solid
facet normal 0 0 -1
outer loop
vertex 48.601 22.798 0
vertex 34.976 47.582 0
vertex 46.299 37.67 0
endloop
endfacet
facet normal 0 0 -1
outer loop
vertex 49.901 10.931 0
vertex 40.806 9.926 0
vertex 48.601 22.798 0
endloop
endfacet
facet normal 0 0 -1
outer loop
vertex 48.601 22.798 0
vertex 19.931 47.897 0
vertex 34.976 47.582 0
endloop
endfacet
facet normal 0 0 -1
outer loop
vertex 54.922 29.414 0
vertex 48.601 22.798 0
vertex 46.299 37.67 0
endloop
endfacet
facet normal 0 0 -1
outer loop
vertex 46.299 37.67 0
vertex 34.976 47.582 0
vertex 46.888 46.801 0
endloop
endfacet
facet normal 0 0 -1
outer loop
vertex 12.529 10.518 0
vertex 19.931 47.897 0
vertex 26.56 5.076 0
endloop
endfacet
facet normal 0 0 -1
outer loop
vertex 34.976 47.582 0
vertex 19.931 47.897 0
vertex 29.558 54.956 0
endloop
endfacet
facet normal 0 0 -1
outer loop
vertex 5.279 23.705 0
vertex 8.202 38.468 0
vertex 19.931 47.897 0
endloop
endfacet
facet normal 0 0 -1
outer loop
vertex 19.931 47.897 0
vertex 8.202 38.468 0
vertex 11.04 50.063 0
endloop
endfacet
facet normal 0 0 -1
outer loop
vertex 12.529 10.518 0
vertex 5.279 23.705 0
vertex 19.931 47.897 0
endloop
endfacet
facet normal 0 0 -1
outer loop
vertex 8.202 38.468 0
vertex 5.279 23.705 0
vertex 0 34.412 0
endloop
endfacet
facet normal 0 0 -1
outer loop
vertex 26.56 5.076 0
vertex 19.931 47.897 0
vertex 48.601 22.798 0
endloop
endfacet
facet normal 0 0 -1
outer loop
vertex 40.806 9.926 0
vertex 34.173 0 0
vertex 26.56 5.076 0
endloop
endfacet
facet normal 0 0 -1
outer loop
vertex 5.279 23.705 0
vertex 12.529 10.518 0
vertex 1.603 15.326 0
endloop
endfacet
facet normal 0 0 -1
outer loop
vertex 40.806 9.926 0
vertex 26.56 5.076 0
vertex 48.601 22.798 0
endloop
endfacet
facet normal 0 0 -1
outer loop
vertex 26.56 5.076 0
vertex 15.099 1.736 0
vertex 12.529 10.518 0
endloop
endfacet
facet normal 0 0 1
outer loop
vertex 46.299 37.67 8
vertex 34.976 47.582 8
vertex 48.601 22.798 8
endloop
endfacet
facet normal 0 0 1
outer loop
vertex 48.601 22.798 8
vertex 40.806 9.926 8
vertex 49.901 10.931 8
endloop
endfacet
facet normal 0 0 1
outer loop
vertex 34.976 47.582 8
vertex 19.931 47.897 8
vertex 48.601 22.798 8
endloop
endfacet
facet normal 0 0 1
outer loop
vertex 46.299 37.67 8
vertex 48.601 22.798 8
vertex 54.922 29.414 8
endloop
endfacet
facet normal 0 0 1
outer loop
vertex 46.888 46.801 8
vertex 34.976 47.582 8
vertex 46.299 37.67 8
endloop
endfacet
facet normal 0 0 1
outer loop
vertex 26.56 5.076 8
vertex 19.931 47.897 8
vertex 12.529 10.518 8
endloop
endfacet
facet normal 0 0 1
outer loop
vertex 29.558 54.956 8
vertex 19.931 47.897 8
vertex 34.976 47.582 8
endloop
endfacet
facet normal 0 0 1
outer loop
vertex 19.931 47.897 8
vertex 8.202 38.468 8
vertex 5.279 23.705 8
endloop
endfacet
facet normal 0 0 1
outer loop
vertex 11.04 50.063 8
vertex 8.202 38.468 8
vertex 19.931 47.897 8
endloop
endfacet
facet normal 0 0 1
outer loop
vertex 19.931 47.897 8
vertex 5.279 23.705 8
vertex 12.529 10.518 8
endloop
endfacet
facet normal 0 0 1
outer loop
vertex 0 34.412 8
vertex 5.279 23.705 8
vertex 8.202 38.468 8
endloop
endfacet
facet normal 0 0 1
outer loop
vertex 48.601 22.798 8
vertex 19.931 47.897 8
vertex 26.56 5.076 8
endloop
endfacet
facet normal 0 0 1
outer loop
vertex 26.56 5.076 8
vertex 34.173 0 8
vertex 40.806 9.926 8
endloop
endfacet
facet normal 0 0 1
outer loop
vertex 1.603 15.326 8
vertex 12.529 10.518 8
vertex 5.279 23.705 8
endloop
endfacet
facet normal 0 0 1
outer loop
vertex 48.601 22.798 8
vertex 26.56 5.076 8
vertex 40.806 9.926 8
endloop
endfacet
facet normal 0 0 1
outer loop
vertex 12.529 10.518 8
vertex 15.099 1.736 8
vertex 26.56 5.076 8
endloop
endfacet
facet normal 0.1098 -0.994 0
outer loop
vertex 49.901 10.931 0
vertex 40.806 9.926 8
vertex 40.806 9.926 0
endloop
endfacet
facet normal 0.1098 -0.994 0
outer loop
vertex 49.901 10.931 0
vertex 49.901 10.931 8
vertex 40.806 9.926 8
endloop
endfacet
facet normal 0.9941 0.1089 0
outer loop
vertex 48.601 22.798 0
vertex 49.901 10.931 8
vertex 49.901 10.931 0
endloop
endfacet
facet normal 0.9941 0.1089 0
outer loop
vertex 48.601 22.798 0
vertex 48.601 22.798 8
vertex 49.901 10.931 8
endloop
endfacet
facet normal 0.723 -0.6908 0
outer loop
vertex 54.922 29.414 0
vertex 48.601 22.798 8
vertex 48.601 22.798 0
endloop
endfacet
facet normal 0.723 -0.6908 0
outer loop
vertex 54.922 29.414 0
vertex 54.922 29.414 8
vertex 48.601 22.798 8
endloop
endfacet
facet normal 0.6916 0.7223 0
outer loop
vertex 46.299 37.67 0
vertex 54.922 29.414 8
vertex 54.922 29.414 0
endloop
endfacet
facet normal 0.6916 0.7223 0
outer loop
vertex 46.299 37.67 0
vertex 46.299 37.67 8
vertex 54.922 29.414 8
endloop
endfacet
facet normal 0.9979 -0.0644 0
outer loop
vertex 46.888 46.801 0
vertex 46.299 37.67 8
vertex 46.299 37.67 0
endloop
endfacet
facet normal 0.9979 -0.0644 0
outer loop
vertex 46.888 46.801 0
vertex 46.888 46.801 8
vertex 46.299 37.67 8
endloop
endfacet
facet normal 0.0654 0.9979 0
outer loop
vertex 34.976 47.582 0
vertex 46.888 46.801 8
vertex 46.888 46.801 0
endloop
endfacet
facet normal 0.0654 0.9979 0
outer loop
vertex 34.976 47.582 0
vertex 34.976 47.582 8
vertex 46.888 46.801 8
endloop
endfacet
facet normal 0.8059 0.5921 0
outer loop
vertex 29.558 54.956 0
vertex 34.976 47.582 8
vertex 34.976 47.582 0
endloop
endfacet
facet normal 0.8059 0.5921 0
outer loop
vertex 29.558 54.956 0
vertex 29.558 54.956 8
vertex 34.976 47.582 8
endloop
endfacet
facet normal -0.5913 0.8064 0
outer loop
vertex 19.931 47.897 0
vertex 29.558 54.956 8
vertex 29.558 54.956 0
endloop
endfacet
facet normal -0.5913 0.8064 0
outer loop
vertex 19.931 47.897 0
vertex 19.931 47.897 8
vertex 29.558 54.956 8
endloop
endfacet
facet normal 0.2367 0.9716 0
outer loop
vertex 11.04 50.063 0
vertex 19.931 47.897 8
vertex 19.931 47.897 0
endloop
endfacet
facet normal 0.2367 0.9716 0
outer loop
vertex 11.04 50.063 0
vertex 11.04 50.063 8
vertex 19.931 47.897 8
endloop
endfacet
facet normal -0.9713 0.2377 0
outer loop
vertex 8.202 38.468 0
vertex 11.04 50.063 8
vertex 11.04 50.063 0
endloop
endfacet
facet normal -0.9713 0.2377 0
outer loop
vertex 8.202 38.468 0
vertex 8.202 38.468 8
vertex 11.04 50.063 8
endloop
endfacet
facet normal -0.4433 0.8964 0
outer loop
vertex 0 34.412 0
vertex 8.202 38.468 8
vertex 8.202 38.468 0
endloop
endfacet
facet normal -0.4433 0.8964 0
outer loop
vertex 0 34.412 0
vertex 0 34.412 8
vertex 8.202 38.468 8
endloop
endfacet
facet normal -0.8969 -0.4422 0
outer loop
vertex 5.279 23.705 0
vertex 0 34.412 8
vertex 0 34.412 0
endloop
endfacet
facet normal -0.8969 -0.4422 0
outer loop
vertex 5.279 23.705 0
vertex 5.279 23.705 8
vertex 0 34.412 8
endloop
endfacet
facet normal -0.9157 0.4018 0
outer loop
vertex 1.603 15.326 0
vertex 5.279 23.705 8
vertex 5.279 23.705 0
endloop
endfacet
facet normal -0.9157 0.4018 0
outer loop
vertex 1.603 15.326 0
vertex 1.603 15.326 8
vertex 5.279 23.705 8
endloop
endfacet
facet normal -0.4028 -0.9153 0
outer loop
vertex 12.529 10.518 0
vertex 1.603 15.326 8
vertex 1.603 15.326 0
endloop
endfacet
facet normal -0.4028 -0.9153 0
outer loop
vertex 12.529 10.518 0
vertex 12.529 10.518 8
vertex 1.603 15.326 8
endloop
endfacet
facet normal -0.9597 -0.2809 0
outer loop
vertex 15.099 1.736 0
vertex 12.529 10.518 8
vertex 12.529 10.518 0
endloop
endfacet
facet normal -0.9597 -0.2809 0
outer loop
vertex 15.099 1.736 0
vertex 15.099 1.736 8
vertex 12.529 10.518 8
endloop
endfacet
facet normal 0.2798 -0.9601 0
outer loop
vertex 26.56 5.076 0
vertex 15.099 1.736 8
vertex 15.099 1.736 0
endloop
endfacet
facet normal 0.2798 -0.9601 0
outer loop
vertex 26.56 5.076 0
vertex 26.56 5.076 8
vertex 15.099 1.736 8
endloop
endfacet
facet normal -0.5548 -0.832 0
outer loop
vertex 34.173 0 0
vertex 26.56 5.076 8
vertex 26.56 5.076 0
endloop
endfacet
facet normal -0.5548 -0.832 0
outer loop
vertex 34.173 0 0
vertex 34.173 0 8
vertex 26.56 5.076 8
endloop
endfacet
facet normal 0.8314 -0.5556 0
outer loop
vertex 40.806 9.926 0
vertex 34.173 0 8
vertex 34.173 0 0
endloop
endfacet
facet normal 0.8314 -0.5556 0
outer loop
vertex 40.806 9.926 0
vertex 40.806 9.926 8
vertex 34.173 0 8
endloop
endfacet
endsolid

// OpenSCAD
$fn = 32;

// ----------------------------------------------------------------------
// Chain sprocket: 9 teeth, 22 mm root radius
// ----------------------------------------------------------------------

// --- parameters (mm) ---
profile_height = 8;       // extrusion height
profile_points = 18;      // points of the closed outline

profile = [[48.601, 22.798], [54.922, 29.414], [46.299, 37.67], [46.888, 46.801], [34.976, 47.582], [29.558, 54.956], [19.931, 47.897], [11.04, 50.063], [8.202, 38.468], [0, 34.412], [5.279, 23.705], [1.603, 15.326], [12.529, 10.518], [15.099, 1.736], [26.56, 5.076], [34.173, 0], [40.806, 9.926], [49.901, 10.931]];  // single closed polygon, 18 points, counter clockwise

// --- the one profile operation ---
linear_extrude(height = profile_height) polygon(points = profile);
